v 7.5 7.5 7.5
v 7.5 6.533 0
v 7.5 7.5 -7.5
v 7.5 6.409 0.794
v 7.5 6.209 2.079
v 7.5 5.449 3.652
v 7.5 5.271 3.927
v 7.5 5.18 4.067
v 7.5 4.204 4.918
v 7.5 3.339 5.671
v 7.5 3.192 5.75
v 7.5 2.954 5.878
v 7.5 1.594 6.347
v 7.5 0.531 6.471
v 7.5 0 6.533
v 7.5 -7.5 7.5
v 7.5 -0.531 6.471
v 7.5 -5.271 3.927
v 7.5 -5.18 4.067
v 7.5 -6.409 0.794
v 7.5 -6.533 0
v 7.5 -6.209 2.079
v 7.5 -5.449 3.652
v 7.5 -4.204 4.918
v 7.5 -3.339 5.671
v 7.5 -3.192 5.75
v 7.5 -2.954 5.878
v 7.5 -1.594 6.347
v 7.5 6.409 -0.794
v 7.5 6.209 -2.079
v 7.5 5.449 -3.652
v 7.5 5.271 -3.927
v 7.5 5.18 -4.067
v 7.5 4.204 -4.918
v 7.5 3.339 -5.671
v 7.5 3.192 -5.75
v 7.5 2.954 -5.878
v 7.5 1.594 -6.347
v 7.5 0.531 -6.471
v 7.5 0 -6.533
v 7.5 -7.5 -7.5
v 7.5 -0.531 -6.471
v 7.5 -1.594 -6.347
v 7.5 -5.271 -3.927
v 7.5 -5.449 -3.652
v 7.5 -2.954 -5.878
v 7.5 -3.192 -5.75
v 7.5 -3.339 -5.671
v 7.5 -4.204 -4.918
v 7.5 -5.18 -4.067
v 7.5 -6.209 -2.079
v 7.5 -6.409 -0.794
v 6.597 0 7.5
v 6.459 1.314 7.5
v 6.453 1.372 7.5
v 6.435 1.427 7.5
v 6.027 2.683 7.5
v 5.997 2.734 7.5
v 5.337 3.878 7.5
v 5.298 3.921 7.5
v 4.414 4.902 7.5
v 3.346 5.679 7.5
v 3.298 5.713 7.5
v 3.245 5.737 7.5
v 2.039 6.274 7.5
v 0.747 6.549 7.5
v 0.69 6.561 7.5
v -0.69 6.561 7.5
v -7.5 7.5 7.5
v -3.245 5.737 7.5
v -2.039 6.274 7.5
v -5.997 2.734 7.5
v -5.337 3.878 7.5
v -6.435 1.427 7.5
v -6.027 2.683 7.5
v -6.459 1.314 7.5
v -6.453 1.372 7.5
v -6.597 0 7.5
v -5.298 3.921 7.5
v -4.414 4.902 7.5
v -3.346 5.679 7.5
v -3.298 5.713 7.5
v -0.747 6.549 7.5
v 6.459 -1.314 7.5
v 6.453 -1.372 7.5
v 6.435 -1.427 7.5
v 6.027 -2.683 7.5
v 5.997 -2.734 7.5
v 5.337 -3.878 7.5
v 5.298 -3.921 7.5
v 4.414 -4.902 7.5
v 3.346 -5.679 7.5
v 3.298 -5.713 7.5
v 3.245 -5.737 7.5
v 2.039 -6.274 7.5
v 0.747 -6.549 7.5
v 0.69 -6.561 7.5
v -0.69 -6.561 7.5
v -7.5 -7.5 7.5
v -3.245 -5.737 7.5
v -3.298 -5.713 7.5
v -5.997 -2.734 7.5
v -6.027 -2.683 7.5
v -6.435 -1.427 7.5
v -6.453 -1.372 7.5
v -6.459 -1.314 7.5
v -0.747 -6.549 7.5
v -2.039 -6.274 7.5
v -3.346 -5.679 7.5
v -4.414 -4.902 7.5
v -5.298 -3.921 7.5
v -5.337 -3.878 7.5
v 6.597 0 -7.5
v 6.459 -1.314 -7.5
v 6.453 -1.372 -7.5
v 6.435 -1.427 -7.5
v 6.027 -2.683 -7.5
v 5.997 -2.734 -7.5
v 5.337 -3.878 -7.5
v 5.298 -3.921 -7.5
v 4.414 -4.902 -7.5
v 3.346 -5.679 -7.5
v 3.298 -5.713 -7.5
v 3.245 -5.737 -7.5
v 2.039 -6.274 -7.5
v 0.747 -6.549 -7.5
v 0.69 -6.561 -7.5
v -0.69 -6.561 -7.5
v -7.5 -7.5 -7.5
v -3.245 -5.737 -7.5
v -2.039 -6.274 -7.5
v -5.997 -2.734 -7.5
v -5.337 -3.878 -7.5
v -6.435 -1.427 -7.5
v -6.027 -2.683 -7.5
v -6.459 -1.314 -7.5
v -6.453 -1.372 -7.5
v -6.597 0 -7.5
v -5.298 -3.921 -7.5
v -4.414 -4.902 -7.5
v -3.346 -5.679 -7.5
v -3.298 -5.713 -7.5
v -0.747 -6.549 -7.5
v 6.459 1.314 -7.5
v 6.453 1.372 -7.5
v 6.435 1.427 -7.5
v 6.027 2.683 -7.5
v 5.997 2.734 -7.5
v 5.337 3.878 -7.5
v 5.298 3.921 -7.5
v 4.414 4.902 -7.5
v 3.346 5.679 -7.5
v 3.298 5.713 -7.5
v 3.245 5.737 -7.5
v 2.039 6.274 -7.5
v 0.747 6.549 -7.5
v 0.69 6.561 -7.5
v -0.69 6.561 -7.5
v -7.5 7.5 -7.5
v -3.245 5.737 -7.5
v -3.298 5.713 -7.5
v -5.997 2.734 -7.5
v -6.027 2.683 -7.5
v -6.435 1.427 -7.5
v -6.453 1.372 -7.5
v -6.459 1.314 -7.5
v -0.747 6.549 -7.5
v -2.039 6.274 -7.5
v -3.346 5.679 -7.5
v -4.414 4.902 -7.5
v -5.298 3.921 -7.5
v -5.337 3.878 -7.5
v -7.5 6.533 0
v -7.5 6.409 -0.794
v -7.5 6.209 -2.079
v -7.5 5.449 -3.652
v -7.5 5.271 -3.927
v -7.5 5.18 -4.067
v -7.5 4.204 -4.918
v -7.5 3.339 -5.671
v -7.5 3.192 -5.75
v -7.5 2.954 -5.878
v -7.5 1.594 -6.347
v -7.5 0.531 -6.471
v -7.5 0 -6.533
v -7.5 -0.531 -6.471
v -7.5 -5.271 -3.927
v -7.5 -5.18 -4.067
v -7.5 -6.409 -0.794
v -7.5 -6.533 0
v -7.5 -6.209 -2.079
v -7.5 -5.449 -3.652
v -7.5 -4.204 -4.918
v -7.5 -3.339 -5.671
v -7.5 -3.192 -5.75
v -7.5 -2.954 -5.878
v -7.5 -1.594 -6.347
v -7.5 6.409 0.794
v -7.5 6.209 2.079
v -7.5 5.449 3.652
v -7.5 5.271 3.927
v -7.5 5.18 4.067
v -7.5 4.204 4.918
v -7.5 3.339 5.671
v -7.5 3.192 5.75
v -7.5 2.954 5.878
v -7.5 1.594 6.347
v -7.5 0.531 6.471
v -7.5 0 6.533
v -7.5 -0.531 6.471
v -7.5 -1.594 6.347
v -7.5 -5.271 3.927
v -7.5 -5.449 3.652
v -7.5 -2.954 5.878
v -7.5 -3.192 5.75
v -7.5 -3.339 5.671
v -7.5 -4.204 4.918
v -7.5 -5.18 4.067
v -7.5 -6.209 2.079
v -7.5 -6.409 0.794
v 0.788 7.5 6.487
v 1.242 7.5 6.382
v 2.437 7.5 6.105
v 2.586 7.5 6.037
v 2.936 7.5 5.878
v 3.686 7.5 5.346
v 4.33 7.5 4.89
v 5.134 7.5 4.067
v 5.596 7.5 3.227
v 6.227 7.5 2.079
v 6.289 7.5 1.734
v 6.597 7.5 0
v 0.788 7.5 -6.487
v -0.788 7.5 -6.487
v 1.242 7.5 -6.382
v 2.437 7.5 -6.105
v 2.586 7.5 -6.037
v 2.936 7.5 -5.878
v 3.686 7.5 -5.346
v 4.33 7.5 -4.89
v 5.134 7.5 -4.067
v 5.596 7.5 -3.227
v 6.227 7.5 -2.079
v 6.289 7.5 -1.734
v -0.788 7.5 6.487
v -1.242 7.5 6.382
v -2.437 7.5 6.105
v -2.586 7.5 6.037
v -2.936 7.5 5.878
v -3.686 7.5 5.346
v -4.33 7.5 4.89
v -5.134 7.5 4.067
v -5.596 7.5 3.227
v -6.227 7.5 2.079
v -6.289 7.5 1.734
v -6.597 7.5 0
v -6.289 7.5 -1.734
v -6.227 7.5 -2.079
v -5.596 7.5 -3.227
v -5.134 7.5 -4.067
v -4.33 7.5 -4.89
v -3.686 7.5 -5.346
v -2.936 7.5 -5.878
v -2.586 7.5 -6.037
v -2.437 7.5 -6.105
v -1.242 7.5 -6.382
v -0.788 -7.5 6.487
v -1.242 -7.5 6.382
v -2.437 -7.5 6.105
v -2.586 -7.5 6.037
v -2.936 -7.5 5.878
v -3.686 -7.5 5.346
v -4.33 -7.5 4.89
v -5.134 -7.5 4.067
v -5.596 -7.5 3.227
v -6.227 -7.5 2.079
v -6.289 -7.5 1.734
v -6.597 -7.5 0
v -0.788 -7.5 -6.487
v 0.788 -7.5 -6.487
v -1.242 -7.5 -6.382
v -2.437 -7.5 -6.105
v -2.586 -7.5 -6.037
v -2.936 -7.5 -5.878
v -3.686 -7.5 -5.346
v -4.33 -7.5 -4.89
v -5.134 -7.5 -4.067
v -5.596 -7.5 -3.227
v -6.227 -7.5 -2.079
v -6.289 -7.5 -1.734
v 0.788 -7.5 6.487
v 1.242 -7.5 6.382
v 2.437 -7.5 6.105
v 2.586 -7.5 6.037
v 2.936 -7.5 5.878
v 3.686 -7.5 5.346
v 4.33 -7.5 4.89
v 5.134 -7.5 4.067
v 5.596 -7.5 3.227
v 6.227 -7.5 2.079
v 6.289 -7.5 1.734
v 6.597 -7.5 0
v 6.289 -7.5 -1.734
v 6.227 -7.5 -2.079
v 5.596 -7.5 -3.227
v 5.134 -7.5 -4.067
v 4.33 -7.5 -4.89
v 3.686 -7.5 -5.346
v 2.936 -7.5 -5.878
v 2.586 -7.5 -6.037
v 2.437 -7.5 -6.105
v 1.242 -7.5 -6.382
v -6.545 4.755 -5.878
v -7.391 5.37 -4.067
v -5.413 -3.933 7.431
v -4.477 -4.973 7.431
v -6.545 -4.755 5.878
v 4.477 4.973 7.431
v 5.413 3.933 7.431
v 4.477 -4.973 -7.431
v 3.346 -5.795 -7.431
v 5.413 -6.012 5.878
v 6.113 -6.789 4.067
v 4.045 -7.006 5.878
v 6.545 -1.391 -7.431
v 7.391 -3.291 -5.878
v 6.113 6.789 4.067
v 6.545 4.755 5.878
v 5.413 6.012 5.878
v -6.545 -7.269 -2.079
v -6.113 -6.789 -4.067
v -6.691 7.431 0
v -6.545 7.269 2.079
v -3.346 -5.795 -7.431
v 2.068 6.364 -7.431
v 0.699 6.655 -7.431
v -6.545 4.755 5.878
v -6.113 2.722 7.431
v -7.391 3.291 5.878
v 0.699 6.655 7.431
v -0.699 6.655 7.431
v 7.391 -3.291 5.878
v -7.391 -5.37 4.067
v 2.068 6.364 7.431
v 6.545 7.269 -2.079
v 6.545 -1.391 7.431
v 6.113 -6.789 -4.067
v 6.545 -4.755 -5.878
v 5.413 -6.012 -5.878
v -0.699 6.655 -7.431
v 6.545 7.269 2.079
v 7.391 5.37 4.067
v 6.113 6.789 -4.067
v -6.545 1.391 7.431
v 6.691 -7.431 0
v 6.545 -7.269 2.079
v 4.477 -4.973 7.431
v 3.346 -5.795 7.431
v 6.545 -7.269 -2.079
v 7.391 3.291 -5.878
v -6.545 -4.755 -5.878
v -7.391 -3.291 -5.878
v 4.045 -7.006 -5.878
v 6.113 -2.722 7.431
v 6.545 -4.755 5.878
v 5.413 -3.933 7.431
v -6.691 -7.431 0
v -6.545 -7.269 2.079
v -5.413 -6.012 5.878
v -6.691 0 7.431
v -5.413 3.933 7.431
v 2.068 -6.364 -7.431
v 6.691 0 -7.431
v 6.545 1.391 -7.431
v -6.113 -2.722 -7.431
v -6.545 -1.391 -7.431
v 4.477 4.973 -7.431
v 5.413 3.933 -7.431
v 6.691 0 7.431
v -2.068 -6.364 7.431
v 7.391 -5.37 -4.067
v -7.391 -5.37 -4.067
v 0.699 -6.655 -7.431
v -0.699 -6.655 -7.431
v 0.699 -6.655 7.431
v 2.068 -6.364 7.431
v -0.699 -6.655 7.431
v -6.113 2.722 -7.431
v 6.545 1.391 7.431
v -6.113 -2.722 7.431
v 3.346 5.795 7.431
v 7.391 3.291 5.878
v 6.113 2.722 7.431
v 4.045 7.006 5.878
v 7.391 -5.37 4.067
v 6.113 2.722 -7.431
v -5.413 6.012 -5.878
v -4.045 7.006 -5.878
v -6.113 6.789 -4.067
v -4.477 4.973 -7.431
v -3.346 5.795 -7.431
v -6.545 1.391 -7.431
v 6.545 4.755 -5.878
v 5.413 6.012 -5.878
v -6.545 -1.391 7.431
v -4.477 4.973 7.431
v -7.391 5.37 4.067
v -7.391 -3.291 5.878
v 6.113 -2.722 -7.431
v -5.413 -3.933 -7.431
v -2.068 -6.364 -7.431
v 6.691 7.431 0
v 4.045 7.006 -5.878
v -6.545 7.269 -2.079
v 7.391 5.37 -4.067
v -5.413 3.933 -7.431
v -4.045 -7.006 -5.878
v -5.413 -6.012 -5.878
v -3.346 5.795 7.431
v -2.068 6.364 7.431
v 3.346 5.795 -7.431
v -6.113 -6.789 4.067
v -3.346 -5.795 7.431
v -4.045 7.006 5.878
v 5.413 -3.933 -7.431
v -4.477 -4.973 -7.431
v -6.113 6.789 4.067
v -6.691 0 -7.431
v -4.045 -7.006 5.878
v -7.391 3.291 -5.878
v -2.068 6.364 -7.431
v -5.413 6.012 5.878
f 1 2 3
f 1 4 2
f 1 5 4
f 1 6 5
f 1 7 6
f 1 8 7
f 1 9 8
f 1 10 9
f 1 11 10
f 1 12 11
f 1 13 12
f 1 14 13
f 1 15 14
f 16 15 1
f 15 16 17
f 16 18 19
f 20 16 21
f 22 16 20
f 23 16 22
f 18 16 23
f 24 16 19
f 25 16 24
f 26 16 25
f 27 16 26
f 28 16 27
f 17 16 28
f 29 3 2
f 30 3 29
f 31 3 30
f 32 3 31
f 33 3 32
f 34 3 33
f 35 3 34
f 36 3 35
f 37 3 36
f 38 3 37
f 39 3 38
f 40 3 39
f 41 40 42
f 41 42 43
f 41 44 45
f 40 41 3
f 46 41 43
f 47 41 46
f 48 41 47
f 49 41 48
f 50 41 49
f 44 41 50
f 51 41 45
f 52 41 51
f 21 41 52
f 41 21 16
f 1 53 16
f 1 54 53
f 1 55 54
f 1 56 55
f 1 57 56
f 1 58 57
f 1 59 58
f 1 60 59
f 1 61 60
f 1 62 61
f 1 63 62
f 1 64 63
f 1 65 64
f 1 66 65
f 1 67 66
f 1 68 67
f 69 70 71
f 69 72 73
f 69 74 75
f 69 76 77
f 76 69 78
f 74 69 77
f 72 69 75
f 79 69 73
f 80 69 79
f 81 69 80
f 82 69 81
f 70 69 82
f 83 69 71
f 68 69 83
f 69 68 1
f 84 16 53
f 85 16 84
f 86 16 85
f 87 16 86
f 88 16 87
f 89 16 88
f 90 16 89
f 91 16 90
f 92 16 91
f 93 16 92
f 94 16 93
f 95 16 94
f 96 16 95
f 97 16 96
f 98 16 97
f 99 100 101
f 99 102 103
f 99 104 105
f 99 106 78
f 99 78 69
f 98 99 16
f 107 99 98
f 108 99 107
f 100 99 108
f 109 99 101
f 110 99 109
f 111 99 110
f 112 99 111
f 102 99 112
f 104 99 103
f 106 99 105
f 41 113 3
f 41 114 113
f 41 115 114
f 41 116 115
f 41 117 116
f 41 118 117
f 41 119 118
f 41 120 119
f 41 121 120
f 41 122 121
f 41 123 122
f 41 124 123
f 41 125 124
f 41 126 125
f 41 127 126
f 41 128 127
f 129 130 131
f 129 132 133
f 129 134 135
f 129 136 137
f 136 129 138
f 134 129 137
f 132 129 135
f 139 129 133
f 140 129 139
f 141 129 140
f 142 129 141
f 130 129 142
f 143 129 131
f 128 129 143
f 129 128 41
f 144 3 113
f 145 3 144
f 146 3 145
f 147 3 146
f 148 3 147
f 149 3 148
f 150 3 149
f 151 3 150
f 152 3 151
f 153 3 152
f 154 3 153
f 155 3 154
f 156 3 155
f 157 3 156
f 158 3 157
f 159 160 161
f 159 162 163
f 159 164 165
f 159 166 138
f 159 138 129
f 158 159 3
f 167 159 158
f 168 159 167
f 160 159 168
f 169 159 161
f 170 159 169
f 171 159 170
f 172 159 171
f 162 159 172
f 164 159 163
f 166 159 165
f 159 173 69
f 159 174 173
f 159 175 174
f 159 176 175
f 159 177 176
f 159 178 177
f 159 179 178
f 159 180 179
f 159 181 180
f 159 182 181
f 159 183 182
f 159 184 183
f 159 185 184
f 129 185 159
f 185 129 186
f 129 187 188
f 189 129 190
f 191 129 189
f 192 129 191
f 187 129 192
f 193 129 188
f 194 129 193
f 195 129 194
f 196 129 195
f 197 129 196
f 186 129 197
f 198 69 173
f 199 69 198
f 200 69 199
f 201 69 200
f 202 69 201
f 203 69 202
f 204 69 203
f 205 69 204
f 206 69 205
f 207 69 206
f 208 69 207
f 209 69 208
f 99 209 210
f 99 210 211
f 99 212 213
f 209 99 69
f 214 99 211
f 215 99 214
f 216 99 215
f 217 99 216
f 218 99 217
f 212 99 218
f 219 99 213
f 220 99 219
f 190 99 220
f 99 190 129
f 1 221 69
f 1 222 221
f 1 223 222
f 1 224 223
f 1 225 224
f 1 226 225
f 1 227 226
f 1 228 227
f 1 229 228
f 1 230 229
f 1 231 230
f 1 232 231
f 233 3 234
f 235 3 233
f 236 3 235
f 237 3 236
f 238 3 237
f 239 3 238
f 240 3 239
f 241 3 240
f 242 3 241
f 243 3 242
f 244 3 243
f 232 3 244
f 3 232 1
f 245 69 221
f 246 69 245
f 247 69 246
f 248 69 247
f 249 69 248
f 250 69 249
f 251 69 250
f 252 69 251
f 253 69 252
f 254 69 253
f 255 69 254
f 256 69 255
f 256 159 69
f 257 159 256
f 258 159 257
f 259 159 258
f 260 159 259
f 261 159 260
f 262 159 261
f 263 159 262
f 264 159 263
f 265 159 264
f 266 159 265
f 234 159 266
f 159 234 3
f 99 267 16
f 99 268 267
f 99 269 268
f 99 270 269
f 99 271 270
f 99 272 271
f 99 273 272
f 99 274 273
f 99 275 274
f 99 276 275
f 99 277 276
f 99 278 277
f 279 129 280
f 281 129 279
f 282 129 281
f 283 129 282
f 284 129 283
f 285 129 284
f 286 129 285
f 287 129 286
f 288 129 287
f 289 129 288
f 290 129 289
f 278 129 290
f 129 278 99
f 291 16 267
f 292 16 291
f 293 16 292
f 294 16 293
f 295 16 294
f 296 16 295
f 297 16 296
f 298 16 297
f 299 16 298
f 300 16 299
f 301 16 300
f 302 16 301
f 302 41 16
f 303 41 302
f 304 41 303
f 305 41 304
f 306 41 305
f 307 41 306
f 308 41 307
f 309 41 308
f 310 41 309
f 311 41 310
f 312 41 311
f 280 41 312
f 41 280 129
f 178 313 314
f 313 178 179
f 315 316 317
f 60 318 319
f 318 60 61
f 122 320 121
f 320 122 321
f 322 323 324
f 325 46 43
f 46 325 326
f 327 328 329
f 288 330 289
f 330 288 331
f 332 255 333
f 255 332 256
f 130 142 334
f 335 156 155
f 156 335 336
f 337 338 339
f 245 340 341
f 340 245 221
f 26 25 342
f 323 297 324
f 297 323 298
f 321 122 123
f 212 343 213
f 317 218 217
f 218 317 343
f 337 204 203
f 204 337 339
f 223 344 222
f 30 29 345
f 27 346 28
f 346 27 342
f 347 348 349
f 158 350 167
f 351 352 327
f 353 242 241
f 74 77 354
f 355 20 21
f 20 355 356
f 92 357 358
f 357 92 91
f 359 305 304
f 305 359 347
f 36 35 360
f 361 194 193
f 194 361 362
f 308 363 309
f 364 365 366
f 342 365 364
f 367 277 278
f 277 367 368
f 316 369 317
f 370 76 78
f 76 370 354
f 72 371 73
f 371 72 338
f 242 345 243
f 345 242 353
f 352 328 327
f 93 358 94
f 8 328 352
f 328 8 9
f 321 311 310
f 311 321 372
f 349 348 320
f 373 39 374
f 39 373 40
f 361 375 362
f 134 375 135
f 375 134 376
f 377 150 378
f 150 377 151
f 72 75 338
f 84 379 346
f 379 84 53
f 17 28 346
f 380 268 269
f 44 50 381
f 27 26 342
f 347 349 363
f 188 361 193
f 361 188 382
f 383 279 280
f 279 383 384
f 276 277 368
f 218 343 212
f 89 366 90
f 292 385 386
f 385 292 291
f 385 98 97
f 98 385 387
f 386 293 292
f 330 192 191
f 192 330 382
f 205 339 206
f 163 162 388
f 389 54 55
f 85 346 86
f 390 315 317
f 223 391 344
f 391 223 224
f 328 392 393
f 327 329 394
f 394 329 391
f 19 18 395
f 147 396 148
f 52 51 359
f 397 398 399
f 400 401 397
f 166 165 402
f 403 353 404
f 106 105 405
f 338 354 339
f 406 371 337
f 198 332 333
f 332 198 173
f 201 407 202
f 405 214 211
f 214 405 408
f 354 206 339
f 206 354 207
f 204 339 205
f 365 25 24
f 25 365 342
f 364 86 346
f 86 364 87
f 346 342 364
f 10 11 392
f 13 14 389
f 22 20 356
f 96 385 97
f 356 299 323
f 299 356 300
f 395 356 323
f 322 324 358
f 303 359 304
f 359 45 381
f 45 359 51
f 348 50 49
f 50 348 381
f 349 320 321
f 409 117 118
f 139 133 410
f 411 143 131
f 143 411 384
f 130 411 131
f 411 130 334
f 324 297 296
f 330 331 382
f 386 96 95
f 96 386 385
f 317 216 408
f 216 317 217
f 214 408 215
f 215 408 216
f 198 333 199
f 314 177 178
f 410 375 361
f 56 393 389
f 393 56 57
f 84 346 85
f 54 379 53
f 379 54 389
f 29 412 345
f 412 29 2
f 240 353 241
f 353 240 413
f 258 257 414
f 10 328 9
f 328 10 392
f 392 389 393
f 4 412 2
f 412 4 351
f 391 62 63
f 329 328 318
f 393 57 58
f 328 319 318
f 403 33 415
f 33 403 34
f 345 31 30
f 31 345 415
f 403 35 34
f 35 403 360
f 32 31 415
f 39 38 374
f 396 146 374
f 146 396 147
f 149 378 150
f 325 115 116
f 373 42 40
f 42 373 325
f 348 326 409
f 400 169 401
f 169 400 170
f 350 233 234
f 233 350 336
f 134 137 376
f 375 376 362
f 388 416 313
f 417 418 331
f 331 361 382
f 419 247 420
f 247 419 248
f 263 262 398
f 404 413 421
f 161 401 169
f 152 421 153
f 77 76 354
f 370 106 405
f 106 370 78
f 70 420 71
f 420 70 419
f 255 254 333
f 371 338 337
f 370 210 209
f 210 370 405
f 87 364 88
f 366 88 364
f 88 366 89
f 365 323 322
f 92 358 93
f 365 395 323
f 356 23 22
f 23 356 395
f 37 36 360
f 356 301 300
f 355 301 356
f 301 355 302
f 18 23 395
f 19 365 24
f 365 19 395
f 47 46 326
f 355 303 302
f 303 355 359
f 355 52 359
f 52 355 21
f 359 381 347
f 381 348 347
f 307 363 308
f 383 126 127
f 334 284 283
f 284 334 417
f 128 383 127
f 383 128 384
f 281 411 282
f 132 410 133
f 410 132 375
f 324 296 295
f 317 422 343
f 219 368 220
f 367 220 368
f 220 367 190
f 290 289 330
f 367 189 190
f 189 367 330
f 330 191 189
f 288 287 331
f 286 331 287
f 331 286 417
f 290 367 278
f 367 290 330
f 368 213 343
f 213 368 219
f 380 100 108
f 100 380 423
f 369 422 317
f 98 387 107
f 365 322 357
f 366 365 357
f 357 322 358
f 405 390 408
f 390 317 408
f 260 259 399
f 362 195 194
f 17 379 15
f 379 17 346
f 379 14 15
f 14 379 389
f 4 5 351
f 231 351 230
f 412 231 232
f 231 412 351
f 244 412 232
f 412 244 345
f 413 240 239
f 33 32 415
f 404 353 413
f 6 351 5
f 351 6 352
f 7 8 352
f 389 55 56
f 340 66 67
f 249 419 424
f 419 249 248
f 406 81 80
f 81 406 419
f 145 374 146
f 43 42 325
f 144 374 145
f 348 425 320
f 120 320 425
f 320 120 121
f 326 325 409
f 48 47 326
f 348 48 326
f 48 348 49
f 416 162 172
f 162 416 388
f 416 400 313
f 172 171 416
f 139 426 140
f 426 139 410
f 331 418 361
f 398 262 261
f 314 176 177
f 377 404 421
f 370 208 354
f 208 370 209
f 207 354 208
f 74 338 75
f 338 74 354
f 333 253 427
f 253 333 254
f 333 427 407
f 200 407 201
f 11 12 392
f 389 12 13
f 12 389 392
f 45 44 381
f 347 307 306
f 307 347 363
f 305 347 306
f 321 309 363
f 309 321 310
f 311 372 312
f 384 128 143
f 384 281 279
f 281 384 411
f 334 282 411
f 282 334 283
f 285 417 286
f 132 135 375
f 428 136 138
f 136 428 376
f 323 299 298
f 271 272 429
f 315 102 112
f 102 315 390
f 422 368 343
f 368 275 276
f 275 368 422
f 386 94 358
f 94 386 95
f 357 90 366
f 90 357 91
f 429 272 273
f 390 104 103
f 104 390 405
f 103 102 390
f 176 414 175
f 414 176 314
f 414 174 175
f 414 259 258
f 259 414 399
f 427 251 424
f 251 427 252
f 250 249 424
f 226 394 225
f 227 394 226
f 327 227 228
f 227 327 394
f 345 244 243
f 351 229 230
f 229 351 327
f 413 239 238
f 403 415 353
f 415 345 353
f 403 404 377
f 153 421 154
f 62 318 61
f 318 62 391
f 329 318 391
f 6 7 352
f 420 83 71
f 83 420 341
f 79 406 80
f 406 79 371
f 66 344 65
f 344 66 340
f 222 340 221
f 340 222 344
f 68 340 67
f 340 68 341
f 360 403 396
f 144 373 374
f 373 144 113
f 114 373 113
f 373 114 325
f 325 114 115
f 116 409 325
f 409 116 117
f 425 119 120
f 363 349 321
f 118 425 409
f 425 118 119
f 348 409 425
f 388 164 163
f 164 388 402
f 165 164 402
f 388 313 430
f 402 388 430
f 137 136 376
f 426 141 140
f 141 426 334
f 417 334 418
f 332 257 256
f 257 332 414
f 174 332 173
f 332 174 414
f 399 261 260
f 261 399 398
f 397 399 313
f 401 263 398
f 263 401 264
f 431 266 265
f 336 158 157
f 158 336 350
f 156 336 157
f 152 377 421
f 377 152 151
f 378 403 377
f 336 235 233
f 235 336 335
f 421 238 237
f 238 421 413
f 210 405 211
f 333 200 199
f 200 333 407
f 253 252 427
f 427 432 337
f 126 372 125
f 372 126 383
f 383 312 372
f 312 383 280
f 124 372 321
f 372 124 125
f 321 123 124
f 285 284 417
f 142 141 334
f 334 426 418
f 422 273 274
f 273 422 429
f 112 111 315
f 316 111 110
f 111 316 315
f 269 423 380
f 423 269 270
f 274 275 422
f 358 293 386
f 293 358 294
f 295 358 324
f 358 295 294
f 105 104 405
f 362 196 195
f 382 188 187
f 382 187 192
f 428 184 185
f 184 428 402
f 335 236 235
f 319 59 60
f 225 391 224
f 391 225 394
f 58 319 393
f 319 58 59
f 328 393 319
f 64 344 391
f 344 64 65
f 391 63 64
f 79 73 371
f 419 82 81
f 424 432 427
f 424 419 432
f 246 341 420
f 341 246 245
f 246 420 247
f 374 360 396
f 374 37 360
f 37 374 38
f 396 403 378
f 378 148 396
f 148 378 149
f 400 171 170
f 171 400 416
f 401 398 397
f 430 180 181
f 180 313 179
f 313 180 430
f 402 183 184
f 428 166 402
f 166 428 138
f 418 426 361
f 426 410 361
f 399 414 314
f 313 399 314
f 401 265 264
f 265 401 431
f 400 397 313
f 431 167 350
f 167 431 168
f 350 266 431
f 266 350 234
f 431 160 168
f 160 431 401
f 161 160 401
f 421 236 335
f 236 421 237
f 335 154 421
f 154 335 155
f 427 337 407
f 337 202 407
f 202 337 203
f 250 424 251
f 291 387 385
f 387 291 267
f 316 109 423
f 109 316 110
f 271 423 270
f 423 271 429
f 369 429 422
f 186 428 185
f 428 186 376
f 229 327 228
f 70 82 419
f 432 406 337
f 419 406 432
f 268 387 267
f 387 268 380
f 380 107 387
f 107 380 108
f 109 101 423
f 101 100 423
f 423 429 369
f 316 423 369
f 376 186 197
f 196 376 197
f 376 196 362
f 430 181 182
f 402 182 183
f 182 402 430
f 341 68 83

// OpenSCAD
translate([0,0,0]) {
    difference() {
        cube(15, center=true);
        sphere(10);
    }
}
